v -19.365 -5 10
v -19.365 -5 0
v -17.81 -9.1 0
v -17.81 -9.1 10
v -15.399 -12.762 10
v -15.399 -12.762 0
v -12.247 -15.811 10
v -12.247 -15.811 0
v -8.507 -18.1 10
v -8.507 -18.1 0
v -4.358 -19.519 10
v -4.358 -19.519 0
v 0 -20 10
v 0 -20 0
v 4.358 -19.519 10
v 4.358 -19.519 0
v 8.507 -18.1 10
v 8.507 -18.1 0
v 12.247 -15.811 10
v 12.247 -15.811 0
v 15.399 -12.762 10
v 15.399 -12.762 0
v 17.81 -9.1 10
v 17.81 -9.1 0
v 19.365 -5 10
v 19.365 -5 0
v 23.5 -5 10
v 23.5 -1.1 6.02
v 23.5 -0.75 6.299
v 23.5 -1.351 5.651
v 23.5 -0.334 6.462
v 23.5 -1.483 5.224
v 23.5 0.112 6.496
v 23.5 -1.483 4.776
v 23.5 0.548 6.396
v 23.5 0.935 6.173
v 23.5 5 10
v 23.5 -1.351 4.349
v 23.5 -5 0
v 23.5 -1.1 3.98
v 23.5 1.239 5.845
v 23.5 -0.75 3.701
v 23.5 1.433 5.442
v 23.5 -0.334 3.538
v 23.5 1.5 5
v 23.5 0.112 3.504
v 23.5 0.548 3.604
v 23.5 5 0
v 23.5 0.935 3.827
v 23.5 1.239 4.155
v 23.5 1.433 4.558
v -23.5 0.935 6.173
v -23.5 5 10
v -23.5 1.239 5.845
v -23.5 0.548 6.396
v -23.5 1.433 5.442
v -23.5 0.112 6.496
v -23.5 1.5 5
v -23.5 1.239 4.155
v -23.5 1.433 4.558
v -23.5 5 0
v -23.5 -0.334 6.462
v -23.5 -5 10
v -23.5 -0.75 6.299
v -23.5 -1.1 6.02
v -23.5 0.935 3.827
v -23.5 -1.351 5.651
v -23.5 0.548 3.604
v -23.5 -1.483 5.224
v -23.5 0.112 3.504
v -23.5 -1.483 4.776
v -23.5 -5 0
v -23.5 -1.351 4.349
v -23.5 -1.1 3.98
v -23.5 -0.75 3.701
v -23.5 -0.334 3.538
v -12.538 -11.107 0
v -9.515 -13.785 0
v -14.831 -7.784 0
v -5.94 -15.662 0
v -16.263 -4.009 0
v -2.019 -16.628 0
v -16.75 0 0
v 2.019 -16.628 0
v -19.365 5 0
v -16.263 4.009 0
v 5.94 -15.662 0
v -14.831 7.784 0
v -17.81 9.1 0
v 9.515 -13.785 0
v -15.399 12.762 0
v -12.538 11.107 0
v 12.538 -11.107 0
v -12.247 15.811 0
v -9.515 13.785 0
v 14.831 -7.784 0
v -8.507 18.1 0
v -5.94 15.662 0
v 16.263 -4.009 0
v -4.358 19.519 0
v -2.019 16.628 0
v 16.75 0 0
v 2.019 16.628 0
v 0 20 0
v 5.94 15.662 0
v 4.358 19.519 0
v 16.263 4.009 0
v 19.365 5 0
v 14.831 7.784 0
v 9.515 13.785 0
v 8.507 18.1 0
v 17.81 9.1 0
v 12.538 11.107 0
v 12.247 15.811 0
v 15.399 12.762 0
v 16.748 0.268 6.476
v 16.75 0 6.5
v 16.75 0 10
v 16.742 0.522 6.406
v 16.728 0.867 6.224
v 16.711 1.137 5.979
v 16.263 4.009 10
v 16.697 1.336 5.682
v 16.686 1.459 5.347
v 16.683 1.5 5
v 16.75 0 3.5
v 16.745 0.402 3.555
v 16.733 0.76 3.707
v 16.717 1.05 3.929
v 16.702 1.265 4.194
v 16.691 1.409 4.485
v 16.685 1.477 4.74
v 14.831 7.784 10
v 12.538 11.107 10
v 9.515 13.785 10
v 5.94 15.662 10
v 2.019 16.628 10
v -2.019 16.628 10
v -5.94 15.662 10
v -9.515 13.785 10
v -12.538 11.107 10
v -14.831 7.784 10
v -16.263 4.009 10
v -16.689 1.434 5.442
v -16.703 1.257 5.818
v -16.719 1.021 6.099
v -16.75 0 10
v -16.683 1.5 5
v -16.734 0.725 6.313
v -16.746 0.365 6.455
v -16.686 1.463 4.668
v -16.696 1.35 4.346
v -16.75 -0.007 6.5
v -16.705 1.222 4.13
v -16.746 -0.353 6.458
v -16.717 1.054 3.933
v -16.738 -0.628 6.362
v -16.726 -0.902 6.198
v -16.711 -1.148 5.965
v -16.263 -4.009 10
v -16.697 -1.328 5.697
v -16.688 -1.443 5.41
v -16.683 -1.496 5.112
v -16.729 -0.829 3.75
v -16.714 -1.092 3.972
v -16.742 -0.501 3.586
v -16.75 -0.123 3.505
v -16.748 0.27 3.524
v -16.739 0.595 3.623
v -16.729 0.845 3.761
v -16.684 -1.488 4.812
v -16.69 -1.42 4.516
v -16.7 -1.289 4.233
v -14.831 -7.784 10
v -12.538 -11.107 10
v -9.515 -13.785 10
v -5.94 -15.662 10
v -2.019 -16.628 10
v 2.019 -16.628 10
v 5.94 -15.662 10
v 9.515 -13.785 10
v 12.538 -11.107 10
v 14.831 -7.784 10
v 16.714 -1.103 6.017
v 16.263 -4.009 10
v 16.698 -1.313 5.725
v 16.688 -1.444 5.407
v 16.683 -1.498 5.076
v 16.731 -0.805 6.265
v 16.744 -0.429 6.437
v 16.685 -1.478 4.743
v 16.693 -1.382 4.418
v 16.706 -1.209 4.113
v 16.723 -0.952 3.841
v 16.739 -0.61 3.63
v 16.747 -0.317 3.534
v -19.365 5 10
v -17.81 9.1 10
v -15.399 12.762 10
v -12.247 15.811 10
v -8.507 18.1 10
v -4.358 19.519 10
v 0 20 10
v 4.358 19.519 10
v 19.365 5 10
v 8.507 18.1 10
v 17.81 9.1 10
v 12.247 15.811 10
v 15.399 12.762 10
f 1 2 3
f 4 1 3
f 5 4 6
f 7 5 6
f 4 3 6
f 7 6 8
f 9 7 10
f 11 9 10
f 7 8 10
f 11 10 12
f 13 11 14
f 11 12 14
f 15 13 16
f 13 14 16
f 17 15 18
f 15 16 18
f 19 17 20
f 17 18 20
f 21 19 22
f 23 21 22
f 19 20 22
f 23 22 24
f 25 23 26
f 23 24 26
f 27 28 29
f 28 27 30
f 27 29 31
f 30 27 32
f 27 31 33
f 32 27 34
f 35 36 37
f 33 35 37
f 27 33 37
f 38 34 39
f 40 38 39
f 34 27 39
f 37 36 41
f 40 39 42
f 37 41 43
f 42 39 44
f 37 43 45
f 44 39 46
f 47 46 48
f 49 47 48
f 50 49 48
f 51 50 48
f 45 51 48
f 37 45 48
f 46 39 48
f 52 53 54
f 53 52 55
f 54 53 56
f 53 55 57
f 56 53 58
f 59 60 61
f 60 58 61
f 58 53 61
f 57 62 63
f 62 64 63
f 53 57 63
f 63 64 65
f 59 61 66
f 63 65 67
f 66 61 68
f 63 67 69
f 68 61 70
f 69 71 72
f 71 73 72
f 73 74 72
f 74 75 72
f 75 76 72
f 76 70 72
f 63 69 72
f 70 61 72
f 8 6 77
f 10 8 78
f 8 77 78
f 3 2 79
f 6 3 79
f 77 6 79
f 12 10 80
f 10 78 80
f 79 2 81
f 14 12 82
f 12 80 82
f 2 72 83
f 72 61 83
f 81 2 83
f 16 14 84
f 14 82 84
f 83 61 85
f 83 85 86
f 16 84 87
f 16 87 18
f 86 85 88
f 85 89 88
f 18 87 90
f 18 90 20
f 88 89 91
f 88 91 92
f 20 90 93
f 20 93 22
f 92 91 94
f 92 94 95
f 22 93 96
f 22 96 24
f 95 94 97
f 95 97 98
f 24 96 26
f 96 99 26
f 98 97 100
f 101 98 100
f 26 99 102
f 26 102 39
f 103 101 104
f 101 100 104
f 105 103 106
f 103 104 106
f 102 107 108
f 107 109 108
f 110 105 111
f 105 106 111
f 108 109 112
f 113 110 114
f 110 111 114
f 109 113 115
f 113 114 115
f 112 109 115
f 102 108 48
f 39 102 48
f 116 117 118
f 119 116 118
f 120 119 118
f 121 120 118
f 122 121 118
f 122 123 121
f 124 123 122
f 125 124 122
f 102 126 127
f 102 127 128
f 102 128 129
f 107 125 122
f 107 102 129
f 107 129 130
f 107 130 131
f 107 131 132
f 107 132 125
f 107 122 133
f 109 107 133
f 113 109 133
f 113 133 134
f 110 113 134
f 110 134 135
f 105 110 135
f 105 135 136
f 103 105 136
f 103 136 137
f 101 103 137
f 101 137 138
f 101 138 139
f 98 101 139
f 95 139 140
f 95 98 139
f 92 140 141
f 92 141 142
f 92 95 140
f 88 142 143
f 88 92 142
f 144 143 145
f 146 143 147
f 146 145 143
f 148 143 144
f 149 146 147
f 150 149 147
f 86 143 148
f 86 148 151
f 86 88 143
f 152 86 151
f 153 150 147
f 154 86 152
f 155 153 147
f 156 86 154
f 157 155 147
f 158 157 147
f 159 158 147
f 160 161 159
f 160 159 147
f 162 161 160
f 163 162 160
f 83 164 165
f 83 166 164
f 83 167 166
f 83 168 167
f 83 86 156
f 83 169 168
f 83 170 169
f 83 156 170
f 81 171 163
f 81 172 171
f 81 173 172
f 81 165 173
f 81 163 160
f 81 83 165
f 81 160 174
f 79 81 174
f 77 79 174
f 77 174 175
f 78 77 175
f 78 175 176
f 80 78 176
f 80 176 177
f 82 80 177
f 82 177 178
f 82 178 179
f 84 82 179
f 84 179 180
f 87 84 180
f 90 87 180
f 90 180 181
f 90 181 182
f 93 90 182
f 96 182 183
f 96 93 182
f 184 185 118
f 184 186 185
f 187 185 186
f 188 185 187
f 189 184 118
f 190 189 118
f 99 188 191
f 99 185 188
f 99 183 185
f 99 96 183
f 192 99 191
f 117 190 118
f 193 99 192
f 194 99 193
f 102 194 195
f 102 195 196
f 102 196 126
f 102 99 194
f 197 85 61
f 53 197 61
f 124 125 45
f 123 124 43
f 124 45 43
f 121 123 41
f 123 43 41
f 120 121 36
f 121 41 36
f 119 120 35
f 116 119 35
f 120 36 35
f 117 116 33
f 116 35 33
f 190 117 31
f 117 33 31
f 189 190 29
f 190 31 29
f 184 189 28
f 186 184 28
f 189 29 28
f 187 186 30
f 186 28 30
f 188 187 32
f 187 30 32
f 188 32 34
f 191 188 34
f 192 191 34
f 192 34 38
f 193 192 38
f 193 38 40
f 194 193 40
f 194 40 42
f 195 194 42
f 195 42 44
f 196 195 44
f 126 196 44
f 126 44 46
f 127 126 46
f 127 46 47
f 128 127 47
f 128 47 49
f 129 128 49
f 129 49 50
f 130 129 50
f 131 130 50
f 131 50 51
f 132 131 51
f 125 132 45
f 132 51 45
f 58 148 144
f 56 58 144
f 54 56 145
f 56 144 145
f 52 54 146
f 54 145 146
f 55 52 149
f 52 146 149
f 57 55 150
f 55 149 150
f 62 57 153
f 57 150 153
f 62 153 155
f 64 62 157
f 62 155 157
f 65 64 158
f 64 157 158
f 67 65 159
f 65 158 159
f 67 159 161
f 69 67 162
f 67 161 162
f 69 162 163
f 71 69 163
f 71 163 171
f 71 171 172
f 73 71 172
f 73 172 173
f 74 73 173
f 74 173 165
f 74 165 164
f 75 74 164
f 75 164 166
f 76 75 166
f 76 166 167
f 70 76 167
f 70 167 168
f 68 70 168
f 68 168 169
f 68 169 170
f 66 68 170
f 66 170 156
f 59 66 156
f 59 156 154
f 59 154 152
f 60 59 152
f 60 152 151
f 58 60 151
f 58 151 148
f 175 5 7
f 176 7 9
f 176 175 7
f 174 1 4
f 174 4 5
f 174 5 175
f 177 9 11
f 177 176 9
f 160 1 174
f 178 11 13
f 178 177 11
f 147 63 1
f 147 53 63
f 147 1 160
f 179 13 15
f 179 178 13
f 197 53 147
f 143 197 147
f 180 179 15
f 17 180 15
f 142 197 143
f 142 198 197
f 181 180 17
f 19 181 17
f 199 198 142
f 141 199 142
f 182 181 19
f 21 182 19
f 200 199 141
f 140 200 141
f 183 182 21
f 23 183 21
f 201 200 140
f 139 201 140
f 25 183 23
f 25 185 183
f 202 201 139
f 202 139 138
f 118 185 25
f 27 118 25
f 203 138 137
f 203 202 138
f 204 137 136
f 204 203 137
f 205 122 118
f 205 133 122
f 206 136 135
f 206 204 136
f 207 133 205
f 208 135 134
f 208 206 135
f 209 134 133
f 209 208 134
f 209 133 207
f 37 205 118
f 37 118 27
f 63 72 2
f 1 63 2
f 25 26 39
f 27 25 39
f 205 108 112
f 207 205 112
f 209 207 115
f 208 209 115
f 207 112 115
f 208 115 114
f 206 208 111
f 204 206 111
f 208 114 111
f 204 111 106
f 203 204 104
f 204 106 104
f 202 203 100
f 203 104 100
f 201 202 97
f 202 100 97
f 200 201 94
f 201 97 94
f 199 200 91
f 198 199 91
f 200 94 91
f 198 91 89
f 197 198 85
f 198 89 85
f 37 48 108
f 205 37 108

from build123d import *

# Parameters (mm, degrees)
CROQUIS1_R              = 16.75
SALIENTE_EXTRUIR1_DEPTH = 10
CROQUIS2_R              = 1.5
CORTAR_EXTRUIR1_DEPTH   = 67


with BuildPart() as part:
    # Croquis1 → Saliente-Extruir1 (new body)
    with BuildSketch(Plane.XY):
        with BuildLine():
            Line((-23.5, -5), (-19.364916731, -5))
            ThreePointArc((-19.364916731, -5), (0, -20), (19.364916731, -5))
            Line((19.364916731, -5), (23.5, -5))
            Line((23.5, -5), (23.5, 5))
            Line((23.5, 5), (19.364916731, 5))
            ThreePointArc((19.364916731, 5), (0, 20), (-19.364916731, 5))
            Line((-19.364916731, 5), (-23.5, 5))
            Line((-23.5, 5), (-23.5, -5))
        make_face()
        Circle(CROQUIS1_R, mode=Mode.SUBTRACT)
    extrude(amount=SALIENTE_EXTRUIR1_DEPTH)

    # Croquis2 → Cortar-Extruir1 (cut)
    with BuildSketch(Plane(origin=(23.5, 0, 0), x_dir=(0, 0, -1), z_dir=(1, 0, 0))):
        with Locations(Location((-5, 0, 0), (0, 0, 90))):
            Circle(CROQUIS2_R)
    extrude(amount=-CORTAR_EXTRUIR1_DEPTH, mode=Mode.SUBTRACT)


solid = part.part
